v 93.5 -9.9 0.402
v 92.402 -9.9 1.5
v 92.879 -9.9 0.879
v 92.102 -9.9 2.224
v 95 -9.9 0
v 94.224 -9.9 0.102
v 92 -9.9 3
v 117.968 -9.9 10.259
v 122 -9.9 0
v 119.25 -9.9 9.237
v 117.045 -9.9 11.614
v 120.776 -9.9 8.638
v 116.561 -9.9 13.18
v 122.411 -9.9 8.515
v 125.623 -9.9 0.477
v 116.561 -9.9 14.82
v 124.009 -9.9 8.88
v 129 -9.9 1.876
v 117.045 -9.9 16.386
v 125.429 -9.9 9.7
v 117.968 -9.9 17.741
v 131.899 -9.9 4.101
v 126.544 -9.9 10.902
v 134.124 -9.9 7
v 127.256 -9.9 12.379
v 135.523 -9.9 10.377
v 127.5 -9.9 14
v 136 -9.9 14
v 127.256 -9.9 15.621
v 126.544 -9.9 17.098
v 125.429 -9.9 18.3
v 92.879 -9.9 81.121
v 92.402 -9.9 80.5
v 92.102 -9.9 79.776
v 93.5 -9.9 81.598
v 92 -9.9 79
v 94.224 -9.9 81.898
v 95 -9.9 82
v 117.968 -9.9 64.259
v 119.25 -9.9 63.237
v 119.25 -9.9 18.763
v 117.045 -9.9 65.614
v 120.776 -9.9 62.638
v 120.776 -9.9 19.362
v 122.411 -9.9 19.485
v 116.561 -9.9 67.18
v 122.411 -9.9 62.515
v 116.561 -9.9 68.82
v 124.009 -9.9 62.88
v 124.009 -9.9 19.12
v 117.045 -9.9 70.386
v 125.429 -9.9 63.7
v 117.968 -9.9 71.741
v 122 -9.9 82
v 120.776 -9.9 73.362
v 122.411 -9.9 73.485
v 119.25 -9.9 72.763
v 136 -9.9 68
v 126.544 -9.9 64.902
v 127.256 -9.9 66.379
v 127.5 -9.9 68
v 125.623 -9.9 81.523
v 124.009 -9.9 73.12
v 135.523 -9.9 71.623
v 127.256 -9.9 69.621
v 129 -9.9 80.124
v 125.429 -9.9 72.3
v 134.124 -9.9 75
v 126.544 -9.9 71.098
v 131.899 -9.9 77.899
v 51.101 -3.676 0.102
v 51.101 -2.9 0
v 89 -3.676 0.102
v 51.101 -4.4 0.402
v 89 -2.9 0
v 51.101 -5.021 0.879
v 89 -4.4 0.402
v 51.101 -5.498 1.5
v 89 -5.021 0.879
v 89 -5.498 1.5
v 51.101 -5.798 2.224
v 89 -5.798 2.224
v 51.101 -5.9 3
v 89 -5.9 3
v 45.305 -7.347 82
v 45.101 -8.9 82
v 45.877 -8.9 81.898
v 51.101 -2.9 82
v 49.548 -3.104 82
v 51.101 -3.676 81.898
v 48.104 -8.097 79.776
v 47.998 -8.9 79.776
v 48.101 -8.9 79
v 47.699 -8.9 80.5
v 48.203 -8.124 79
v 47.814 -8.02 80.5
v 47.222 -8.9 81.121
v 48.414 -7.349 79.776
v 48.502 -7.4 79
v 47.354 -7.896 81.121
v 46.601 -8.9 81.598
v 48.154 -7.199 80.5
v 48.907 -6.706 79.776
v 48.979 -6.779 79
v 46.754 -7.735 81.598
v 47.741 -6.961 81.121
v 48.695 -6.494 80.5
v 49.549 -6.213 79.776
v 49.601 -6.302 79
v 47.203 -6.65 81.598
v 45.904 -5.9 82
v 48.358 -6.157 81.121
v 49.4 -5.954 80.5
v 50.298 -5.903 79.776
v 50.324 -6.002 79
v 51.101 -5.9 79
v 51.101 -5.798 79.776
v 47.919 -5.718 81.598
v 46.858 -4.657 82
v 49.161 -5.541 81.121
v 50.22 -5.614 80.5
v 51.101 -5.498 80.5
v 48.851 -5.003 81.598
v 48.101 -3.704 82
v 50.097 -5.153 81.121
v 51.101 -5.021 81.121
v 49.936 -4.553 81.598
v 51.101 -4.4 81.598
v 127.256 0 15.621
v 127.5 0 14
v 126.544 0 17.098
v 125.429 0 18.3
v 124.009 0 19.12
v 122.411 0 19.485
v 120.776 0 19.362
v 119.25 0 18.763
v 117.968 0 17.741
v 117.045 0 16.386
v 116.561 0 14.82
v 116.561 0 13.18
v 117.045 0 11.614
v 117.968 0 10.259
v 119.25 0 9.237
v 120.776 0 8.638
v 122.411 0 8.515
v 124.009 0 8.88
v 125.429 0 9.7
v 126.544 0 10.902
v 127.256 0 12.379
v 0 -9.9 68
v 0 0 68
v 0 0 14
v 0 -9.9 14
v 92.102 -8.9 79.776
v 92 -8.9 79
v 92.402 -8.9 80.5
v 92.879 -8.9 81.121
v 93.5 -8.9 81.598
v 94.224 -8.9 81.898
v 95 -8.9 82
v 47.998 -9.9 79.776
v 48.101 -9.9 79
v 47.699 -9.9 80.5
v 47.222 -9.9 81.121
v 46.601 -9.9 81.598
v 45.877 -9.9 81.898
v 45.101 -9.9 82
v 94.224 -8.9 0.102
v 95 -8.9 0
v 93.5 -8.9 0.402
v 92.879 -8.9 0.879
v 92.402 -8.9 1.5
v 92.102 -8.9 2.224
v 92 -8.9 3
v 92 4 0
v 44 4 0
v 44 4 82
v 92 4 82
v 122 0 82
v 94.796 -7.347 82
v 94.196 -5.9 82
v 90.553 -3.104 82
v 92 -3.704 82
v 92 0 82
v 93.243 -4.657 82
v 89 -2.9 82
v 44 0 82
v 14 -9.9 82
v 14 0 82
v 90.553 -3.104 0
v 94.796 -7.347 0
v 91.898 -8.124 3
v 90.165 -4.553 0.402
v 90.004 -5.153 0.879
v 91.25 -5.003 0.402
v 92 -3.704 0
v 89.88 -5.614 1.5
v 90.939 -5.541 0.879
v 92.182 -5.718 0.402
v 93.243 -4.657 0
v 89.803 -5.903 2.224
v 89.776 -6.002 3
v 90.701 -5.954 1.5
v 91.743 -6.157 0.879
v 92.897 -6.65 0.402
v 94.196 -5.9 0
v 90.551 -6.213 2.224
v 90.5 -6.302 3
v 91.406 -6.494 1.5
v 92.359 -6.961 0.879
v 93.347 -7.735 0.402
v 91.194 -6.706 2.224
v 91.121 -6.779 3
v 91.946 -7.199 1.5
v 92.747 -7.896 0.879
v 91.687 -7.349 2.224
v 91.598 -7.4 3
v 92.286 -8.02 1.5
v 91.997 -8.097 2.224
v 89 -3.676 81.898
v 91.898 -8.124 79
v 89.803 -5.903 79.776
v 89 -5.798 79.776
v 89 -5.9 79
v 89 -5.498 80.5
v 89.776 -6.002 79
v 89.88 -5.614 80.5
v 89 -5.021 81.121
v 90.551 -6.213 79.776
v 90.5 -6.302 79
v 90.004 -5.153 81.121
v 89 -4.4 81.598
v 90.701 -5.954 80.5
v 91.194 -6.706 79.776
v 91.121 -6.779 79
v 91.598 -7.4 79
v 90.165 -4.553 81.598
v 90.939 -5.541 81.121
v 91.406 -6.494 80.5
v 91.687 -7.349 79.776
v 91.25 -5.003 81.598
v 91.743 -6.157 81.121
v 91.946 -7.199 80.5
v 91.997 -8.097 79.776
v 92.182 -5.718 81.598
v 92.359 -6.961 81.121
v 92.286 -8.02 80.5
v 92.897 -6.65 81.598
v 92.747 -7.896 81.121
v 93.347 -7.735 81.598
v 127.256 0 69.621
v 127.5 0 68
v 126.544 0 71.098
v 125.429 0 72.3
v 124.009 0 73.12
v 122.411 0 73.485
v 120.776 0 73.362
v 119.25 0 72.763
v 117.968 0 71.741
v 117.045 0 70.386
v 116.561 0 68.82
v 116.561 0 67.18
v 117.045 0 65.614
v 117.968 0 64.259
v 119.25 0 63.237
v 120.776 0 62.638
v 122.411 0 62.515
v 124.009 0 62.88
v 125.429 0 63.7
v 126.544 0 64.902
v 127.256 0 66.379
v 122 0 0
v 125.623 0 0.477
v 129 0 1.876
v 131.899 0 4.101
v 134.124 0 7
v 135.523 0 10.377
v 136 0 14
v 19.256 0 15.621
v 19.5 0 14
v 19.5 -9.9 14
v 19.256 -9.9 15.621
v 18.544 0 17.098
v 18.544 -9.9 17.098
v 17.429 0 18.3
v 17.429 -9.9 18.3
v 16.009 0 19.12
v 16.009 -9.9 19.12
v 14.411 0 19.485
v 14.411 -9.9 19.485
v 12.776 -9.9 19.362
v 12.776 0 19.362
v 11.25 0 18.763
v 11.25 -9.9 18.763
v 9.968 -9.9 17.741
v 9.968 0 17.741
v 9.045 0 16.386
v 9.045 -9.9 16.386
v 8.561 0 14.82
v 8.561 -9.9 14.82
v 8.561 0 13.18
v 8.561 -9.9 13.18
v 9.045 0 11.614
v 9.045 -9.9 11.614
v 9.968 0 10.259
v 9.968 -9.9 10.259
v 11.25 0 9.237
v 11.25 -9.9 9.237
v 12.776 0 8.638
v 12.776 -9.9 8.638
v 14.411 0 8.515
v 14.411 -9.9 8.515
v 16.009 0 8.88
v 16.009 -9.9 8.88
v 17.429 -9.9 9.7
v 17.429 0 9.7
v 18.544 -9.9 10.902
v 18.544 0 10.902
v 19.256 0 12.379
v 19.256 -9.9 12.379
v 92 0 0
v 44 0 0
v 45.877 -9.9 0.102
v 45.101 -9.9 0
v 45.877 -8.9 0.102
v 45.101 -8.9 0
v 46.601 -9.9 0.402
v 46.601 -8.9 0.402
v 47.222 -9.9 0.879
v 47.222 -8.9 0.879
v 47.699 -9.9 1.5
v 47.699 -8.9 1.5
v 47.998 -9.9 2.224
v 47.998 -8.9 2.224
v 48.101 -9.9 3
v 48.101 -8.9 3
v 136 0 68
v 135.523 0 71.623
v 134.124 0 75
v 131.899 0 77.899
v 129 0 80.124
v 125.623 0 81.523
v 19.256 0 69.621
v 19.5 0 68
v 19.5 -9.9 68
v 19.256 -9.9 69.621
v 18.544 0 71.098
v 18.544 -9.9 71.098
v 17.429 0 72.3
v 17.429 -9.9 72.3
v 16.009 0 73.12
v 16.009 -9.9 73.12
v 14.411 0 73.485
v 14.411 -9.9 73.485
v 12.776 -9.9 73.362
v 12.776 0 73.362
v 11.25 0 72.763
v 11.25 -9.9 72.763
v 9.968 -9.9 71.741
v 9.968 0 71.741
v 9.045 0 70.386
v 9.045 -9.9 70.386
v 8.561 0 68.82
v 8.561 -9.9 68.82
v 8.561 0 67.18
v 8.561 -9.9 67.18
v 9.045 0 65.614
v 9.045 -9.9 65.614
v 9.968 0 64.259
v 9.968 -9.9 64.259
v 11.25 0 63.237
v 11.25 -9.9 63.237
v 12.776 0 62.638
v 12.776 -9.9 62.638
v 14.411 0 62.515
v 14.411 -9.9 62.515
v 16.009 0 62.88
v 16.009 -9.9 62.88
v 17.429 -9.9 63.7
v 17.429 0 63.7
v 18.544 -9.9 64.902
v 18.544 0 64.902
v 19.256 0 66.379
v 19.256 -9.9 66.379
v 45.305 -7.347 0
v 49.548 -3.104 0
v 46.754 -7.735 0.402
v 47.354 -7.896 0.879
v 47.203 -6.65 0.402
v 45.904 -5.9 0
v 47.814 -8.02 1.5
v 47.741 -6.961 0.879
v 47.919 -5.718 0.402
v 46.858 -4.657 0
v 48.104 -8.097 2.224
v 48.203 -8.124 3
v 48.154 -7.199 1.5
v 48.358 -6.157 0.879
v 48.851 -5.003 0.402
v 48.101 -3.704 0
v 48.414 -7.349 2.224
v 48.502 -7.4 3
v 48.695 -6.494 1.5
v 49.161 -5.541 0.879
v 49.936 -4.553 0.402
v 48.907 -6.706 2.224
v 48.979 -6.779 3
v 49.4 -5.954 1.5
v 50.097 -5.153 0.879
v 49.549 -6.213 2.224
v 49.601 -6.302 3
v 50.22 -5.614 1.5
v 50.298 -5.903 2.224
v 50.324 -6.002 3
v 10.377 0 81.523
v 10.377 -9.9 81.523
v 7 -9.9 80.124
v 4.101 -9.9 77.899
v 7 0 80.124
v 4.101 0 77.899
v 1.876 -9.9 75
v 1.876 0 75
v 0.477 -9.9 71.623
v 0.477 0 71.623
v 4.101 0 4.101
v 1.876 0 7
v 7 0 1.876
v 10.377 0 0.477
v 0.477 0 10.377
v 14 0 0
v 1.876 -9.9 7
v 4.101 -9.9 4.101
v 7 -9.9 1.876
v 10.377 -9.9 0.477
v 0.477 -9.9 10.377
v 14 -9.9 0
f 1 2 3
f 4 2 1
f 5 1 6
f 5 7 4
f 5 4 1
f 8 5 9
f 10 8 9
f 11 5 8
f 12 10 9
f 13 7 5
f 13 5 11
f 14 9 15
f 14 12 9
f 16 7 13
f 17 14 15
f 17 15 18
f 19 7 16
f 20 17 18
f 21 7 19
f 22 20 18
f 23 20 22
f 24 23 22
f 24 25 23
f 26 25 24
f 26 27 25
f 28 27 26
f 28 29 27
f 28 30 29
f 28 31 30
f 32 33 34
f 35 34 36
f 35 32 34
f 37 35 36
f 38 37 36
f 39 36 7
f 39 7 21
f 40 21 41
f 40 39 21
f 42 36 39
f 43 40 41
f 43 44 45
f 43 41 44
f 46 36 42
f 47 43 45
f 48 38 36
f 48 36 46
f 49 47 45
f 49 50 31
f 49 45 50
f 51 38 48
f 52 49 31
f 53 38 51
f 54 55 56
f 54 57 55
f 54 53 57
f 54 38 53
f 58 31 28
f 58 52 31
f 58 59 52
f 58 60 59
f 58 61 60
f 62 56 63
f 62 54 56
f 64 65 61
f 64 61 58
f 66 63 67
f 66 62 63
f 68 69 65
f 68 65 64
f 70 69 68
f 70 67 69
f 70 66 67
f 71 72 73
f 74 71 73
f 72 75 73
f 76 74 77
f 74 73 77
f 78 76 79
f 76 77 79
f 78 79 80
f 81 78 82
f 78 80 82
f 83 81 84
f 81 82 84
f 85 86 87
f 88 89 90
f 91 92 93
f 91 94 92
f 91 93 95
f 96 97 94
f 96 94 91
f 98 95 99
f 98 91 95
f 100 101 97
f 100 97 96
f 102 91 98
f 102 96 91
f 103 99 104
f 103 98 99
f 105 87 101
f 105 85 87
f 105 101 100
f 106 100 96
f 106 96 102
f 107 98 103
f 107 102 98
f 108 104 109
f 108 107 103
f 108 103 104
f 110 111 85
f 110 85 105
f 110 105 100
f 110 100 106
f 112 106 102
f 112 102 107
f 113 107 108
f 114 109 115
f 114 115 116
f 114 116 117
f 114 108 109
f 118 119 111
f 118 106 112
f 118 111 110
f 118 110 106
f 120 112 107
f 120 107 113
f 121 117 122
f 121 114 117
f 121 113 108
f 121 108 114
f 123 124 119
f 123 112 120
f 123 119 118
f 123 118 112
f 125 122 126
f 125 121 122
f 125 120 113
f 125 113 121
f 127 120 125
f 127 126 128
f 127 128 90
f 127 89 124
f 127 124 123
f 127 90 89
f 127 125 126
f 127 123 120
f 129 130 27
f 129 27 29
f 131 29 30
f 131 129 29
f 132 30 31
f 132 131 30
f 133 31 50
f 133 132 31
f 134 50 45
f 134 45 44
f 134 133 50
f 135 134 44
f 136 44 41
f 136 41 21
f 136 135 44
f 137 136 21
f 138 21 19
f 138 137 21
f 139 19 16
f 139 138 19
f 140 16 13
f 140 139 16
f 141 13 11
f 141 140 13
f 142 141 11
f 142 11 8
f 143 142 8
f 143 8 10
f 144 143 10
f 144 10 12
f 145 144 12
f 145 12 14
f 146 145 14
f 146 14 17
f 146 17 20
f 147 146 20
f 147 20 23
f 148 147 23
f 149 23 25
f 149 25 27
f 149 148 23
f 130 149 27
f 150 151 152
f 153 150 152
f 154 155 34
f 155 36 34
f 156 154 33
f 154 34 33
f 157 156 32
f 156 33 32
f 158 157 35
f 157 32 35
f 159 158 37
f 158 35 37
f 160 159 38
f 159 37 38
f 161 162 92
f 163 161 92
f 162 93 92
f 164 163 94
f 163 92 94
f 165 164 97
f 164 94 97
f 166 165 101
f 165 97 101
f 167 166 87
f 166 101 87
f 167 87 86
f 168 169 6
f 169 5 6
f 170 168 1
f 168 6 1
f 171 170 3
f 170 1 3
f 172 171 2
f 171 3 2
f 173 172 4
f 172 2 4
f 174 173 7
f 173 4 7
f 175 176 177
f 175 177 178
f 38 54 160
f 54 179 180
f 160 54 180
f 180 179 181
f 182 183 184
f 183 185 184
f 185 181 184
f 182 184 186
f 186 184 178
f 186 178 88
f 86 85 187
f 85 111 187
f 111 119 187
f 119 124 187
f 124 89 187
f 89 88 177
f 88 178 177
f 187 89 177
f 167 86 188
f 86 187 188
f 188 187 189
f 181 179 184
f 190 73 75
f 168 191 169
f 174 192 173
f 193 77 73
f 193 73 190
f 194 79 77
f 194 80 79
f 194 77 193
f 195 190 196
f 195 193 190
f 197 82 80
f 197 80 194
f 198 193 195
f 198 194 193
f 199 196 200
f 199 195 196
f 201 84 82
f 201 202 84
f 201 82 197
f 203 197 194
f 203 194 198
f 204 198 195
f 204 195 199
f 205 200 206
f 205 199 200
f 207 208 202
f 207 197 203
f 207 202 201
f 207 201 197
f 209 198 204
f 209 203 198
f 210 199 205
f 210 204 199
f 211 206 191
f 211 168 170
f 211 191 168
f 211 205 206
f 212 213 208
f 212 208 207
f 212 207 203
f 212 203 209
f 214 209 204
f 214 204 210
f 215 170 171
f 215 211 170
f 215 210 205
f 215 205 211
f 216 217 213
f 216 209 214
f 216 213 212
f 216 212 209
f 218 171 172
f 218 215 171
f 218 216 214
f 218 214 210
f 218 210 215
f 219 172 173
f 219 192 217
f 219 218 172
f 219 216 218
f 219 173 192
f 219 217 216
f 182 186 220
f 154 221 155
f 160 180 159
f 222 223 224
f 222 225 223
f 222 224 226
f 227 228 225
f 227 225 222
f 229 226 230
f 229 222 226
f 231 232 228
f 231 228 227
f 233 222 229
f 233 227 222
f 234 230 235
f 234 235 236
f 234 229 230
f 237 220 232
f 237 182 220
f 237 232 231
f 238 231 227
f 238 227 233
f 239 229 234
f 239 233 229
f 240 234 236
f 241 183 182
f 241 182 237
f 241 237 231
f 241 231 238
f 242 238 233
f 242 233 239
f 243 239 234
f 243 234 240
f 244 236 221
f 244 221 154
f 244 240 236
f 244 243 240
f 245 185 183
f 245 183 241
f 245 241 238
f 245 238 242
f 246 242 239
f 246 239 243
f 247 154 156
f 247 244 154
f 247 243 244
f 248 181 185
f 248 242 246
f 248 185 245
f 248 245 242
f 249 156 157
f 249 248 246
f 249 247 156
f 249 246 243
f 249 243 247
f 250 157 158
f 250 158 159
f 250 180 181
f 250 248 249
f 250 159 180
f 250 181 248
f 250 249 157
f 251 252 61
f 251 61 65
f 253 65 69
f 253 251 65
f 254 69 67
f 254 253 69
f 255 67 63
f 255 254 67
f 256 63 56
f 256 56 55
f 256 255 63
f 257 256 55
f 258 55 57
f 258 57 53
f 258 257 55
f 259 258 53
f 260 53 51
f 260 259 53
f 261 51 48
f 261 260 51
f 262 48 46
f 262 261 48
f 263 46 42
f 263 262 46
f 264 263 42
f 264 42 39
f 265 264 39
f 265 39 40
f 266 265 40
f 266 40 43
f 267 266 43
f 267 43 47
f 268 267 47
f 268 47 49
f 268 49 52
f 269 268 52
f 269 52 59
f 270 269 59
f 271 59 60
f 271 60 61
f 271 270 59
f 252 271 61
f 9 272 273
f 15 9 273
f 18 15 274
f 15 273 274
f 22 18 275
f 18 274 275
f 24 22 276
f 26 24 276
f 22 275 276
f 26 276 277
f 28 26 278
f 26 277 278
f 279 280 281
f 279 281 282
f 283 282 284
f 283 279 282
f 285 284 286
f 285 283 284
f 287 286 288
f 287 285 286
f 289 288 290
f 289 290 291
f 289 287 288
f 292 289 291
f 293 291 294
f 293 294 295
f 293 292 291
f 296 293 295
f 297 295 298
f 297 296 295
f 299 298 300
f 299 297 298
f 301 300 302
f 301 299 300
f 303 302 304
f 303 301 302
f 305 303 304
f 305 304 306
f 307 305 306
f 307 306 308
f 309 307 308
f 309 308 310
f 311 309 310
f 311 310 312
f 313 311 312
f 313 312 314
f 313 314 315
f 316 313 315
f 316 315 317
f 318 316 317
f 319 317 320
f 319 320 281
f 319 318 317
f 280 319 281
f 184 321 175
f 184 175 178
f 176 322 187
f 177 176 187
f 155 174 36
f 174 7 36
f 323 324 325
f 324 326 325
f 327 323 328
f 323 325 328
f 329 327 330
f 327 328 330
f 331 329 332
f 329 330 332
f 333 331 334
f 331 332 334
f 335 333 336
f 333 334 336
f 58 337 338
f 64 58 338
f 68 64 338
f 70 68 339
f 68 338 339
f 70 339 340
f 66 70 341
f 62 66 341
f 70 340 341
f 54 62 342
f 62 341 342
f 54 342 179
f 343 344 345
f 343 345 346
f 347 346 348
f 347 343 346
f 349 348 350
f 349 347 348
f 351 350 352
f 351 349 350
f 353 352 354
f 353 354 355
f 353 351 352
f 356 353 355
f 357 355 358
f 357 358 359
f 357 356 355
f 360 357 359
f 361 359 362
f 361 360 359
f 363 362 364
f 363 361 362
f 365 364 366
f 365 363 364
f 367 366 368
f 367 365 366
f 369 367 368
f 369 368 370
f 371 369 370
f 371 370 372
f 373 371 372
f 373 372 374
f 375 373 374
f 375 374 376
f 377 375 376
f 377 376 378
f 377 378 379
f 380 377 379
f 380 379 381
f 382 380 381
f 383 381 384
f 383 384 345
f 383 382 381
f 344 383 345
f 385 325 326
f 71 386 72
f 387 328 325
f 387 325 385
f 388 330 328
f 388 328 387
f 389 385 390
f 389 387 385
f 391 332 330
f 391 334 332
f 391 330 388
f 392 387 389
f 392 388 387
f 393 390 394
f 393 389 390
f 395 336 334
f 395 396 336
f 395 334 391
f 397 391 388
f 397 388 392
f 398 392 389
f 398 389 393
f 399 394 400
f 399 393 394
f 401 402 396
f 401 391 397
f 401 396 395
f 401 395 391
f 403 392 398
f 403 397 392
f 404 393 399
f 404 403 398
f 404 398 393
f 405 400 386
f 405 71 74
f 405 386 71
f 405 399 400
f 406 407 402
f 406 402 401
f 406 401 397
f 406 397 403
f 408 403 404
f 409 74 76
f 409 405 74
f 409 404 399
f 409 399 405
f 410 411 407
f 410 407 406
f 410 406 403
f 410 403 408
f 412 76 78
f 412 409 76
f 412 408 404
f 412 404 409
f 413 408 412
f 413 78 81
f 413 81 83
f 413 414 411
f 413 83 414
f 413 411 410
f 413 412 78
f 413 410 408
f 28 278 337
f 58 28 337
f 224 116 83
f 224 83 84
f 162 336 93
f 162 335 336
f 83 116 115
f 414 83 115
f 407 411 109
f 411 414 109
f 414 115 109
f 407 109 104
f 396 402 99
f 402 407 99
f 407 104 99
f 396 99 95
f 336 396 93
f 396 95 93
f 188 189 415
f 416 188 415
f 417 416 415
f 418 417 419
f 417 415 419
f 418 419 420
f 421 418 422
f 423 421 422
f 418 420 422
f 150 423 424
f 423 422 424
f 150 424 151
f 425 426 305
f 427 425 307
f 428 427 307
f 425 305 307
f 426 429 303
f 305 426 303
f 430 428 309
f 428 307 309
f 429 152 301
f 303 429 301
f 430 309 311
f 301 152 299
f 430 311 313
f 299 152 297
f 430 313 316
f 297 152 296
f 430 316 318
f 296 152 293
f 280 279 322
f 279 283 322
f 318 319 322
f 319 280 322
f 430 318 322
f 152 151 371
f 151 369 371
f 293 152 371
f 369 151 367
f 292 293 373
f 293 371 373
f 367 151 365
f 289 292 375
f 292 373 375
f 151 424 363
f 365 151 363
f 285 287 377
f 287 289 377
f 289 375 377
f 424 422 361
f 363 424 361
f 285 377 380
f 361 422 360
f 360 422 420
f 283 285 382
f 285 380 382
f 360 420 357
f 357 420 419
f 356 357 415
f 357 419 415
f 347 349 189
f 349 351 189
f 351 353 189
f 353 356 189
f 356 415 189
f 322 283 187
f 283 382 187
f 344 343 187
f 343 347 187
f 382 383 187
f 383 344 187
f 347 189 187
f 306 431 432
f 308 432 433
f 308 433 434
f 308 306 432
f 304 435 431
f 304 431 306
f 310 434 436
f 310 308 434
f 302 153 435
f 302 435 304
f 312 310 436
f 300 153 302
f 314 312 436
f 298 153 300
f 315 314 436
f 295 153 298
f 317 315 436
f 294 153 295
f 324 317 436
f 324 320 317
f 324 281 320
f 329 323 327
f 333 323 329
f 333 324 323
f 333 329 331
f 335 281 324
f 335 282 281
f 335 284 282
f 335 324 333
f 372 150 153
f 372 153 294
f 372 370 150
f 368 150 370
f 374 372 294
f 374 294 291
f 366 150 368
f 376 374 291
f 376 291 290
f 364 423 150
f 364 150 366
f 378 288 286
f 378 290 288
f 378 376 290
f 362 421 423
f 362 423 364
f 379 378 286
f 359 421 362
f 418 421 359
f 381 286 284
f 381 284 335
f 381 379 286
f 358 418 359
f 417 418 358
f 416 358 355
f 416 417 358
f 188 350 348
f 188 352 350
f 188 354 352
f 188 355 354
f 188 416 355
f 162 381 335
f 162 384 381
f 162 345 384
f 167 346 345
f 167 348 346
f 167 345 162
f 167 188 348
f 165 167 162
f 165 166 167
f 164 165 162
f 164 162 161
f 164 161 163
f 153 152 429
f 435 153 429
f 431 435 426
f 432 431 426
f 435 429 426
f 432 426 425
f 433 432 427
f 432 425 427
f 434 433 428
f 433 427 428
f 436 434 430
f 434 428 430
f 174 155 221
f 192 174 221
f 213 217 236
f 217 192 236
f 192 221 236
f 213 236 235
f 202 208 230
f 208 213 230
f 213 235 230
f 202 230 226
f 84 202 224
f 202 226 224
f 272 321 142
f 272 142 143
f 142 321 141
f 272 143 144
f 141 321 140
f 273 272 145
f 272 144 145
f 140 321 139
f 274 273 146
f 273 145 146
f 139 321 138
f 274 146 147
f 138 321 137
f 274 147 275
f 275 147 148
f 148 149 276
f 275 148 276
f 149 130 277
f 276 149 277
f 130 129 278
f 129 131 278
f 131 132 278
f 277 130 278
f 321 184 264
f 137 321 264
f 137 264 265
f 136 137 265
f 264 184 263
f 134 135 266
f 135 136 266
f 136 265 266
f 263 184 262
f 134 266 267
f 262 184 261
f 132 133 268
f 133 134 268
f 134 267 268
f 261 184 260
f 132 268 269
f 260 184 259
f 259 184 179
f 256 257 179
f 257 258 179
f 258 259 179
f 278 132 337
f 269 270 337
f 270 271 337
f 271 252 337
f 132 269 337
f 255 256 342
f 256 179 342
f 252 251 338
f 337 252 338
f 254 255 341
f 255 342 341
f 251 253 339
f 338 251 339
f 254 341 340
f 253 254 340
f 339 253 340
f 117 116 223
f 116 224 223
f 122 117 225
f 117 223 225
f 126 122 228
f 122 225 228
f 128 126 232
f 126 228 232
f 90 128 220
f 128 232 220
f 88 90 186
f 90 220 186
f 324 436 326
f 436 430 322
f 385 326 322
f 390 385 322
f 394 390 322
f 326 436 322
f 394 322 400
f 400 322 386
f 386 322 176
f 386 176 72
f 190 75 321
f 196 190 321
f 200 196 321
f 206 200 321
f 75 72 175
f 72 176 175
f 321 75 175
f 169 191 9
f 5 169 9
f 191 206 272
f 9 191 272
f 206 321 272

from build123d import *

# Parameters (mm, degrees)
F0_W     = 48
F0_H     = 82
F1_DEPTH = 4
F0_R     = 5.5
F2_DEPTH = 9.9
F3_W     = 43.8994949366
F3_H     = 82
F4_DEPTH = 4
F5_F1_R  = 3
F5_F2_R  = 3


with BuildPart() as f1:
    # F0 (on Front) → F1 (new body)
    with BuildSketch(Plane.XZ):
        with Locations((68, 41)):
            Rectangle(F0_W, F0_H)
    extrude(amount=-F1_DEPTH)

    # F0 (on Front) → F2 (join)
    with BuildSketch(Plane.XZ):
        with BuildLine():
            ThreePointArc((0, 14), (4.1005050634, 4.1005050634), (14, 0))
            Line((14, 0), (44, 0))
            Line((44, 0), (44, 82))
            Line((44, 82), (14, 82))
            ThreePointArc((14, 82), (4.1005050634, 77.8994949366), (0, 68))
            Line((0, 68), (0, 14))
        make_face()
        with Locations((14, 14)):
            Circle(F0_R, mode=Mode.SUBTRACT)
        with Locations((14, 68)):
            Circle(F0_R, mode=Mode.SUBTRACT)
        with Locations((68, 41)):
            Rectangle(F0_W, F0_H)
        with BuildLine():
            Line((92, 82), (92, 0))
            Line((92, 0), (122, 0))
            ThreePointArc((122, 0), (131.8994949366, 4.1005050634), (136, 14))
            Line((136, 14), (136, 68))
            ThreePointArc((136, 68), (131.8994949366, 77.8994949366), (122, 82))
            Line((122, 82), (92, 82))
        make_face()
        with Locations((122, 14)):
            Circle(F0_R, mode=Mode.SUBTRACT)
        with Locations((122, 68)):
            Circle(F0_R, mode=Mode.SUBTRACT)
    extrude(amount=F2_DEPTH)

    # F3 (on face) → F4 (cut)
    with BuildSketch(Plane.XZ.offset(9.9)):
        with Locations((70.0502525317, 41)):
            Rectangle(F3_W, F3_H)
    extrude(amount=-F4_DEPTH, mode=Mode.SUBTRACT)

    # F5: fillet of radius 3 on 4 edges, made by hand

    # F5_f1
    f5_f1_edges = [f1.edges().sort_by_distance(p)[0] for p in [
        (48.1005050634, -5.9, 41),
        (92, -5.9, 41),
    ]]
    fillet(f5_f1_edges, radius=F5_F1_R)

    # F5_f2
    f5_f2_edges = [f1.edges().sort_by_distance(p)[0] for p in [
        (70.0502525317, -5.9, 0),
        (70.0502525317, -5.9, 82),
        (91.1213203436, -6.7786796564, 82),
        (48.9791847198, -6.7786796564, 82),
        (48.9791847198, -6.7786796564, 0),
        (91.1213203436, -6.7786796564, 0),
    ]]
    fillet(f5_f2_edges, radius=F5_F2_R)


solid = f1.part
